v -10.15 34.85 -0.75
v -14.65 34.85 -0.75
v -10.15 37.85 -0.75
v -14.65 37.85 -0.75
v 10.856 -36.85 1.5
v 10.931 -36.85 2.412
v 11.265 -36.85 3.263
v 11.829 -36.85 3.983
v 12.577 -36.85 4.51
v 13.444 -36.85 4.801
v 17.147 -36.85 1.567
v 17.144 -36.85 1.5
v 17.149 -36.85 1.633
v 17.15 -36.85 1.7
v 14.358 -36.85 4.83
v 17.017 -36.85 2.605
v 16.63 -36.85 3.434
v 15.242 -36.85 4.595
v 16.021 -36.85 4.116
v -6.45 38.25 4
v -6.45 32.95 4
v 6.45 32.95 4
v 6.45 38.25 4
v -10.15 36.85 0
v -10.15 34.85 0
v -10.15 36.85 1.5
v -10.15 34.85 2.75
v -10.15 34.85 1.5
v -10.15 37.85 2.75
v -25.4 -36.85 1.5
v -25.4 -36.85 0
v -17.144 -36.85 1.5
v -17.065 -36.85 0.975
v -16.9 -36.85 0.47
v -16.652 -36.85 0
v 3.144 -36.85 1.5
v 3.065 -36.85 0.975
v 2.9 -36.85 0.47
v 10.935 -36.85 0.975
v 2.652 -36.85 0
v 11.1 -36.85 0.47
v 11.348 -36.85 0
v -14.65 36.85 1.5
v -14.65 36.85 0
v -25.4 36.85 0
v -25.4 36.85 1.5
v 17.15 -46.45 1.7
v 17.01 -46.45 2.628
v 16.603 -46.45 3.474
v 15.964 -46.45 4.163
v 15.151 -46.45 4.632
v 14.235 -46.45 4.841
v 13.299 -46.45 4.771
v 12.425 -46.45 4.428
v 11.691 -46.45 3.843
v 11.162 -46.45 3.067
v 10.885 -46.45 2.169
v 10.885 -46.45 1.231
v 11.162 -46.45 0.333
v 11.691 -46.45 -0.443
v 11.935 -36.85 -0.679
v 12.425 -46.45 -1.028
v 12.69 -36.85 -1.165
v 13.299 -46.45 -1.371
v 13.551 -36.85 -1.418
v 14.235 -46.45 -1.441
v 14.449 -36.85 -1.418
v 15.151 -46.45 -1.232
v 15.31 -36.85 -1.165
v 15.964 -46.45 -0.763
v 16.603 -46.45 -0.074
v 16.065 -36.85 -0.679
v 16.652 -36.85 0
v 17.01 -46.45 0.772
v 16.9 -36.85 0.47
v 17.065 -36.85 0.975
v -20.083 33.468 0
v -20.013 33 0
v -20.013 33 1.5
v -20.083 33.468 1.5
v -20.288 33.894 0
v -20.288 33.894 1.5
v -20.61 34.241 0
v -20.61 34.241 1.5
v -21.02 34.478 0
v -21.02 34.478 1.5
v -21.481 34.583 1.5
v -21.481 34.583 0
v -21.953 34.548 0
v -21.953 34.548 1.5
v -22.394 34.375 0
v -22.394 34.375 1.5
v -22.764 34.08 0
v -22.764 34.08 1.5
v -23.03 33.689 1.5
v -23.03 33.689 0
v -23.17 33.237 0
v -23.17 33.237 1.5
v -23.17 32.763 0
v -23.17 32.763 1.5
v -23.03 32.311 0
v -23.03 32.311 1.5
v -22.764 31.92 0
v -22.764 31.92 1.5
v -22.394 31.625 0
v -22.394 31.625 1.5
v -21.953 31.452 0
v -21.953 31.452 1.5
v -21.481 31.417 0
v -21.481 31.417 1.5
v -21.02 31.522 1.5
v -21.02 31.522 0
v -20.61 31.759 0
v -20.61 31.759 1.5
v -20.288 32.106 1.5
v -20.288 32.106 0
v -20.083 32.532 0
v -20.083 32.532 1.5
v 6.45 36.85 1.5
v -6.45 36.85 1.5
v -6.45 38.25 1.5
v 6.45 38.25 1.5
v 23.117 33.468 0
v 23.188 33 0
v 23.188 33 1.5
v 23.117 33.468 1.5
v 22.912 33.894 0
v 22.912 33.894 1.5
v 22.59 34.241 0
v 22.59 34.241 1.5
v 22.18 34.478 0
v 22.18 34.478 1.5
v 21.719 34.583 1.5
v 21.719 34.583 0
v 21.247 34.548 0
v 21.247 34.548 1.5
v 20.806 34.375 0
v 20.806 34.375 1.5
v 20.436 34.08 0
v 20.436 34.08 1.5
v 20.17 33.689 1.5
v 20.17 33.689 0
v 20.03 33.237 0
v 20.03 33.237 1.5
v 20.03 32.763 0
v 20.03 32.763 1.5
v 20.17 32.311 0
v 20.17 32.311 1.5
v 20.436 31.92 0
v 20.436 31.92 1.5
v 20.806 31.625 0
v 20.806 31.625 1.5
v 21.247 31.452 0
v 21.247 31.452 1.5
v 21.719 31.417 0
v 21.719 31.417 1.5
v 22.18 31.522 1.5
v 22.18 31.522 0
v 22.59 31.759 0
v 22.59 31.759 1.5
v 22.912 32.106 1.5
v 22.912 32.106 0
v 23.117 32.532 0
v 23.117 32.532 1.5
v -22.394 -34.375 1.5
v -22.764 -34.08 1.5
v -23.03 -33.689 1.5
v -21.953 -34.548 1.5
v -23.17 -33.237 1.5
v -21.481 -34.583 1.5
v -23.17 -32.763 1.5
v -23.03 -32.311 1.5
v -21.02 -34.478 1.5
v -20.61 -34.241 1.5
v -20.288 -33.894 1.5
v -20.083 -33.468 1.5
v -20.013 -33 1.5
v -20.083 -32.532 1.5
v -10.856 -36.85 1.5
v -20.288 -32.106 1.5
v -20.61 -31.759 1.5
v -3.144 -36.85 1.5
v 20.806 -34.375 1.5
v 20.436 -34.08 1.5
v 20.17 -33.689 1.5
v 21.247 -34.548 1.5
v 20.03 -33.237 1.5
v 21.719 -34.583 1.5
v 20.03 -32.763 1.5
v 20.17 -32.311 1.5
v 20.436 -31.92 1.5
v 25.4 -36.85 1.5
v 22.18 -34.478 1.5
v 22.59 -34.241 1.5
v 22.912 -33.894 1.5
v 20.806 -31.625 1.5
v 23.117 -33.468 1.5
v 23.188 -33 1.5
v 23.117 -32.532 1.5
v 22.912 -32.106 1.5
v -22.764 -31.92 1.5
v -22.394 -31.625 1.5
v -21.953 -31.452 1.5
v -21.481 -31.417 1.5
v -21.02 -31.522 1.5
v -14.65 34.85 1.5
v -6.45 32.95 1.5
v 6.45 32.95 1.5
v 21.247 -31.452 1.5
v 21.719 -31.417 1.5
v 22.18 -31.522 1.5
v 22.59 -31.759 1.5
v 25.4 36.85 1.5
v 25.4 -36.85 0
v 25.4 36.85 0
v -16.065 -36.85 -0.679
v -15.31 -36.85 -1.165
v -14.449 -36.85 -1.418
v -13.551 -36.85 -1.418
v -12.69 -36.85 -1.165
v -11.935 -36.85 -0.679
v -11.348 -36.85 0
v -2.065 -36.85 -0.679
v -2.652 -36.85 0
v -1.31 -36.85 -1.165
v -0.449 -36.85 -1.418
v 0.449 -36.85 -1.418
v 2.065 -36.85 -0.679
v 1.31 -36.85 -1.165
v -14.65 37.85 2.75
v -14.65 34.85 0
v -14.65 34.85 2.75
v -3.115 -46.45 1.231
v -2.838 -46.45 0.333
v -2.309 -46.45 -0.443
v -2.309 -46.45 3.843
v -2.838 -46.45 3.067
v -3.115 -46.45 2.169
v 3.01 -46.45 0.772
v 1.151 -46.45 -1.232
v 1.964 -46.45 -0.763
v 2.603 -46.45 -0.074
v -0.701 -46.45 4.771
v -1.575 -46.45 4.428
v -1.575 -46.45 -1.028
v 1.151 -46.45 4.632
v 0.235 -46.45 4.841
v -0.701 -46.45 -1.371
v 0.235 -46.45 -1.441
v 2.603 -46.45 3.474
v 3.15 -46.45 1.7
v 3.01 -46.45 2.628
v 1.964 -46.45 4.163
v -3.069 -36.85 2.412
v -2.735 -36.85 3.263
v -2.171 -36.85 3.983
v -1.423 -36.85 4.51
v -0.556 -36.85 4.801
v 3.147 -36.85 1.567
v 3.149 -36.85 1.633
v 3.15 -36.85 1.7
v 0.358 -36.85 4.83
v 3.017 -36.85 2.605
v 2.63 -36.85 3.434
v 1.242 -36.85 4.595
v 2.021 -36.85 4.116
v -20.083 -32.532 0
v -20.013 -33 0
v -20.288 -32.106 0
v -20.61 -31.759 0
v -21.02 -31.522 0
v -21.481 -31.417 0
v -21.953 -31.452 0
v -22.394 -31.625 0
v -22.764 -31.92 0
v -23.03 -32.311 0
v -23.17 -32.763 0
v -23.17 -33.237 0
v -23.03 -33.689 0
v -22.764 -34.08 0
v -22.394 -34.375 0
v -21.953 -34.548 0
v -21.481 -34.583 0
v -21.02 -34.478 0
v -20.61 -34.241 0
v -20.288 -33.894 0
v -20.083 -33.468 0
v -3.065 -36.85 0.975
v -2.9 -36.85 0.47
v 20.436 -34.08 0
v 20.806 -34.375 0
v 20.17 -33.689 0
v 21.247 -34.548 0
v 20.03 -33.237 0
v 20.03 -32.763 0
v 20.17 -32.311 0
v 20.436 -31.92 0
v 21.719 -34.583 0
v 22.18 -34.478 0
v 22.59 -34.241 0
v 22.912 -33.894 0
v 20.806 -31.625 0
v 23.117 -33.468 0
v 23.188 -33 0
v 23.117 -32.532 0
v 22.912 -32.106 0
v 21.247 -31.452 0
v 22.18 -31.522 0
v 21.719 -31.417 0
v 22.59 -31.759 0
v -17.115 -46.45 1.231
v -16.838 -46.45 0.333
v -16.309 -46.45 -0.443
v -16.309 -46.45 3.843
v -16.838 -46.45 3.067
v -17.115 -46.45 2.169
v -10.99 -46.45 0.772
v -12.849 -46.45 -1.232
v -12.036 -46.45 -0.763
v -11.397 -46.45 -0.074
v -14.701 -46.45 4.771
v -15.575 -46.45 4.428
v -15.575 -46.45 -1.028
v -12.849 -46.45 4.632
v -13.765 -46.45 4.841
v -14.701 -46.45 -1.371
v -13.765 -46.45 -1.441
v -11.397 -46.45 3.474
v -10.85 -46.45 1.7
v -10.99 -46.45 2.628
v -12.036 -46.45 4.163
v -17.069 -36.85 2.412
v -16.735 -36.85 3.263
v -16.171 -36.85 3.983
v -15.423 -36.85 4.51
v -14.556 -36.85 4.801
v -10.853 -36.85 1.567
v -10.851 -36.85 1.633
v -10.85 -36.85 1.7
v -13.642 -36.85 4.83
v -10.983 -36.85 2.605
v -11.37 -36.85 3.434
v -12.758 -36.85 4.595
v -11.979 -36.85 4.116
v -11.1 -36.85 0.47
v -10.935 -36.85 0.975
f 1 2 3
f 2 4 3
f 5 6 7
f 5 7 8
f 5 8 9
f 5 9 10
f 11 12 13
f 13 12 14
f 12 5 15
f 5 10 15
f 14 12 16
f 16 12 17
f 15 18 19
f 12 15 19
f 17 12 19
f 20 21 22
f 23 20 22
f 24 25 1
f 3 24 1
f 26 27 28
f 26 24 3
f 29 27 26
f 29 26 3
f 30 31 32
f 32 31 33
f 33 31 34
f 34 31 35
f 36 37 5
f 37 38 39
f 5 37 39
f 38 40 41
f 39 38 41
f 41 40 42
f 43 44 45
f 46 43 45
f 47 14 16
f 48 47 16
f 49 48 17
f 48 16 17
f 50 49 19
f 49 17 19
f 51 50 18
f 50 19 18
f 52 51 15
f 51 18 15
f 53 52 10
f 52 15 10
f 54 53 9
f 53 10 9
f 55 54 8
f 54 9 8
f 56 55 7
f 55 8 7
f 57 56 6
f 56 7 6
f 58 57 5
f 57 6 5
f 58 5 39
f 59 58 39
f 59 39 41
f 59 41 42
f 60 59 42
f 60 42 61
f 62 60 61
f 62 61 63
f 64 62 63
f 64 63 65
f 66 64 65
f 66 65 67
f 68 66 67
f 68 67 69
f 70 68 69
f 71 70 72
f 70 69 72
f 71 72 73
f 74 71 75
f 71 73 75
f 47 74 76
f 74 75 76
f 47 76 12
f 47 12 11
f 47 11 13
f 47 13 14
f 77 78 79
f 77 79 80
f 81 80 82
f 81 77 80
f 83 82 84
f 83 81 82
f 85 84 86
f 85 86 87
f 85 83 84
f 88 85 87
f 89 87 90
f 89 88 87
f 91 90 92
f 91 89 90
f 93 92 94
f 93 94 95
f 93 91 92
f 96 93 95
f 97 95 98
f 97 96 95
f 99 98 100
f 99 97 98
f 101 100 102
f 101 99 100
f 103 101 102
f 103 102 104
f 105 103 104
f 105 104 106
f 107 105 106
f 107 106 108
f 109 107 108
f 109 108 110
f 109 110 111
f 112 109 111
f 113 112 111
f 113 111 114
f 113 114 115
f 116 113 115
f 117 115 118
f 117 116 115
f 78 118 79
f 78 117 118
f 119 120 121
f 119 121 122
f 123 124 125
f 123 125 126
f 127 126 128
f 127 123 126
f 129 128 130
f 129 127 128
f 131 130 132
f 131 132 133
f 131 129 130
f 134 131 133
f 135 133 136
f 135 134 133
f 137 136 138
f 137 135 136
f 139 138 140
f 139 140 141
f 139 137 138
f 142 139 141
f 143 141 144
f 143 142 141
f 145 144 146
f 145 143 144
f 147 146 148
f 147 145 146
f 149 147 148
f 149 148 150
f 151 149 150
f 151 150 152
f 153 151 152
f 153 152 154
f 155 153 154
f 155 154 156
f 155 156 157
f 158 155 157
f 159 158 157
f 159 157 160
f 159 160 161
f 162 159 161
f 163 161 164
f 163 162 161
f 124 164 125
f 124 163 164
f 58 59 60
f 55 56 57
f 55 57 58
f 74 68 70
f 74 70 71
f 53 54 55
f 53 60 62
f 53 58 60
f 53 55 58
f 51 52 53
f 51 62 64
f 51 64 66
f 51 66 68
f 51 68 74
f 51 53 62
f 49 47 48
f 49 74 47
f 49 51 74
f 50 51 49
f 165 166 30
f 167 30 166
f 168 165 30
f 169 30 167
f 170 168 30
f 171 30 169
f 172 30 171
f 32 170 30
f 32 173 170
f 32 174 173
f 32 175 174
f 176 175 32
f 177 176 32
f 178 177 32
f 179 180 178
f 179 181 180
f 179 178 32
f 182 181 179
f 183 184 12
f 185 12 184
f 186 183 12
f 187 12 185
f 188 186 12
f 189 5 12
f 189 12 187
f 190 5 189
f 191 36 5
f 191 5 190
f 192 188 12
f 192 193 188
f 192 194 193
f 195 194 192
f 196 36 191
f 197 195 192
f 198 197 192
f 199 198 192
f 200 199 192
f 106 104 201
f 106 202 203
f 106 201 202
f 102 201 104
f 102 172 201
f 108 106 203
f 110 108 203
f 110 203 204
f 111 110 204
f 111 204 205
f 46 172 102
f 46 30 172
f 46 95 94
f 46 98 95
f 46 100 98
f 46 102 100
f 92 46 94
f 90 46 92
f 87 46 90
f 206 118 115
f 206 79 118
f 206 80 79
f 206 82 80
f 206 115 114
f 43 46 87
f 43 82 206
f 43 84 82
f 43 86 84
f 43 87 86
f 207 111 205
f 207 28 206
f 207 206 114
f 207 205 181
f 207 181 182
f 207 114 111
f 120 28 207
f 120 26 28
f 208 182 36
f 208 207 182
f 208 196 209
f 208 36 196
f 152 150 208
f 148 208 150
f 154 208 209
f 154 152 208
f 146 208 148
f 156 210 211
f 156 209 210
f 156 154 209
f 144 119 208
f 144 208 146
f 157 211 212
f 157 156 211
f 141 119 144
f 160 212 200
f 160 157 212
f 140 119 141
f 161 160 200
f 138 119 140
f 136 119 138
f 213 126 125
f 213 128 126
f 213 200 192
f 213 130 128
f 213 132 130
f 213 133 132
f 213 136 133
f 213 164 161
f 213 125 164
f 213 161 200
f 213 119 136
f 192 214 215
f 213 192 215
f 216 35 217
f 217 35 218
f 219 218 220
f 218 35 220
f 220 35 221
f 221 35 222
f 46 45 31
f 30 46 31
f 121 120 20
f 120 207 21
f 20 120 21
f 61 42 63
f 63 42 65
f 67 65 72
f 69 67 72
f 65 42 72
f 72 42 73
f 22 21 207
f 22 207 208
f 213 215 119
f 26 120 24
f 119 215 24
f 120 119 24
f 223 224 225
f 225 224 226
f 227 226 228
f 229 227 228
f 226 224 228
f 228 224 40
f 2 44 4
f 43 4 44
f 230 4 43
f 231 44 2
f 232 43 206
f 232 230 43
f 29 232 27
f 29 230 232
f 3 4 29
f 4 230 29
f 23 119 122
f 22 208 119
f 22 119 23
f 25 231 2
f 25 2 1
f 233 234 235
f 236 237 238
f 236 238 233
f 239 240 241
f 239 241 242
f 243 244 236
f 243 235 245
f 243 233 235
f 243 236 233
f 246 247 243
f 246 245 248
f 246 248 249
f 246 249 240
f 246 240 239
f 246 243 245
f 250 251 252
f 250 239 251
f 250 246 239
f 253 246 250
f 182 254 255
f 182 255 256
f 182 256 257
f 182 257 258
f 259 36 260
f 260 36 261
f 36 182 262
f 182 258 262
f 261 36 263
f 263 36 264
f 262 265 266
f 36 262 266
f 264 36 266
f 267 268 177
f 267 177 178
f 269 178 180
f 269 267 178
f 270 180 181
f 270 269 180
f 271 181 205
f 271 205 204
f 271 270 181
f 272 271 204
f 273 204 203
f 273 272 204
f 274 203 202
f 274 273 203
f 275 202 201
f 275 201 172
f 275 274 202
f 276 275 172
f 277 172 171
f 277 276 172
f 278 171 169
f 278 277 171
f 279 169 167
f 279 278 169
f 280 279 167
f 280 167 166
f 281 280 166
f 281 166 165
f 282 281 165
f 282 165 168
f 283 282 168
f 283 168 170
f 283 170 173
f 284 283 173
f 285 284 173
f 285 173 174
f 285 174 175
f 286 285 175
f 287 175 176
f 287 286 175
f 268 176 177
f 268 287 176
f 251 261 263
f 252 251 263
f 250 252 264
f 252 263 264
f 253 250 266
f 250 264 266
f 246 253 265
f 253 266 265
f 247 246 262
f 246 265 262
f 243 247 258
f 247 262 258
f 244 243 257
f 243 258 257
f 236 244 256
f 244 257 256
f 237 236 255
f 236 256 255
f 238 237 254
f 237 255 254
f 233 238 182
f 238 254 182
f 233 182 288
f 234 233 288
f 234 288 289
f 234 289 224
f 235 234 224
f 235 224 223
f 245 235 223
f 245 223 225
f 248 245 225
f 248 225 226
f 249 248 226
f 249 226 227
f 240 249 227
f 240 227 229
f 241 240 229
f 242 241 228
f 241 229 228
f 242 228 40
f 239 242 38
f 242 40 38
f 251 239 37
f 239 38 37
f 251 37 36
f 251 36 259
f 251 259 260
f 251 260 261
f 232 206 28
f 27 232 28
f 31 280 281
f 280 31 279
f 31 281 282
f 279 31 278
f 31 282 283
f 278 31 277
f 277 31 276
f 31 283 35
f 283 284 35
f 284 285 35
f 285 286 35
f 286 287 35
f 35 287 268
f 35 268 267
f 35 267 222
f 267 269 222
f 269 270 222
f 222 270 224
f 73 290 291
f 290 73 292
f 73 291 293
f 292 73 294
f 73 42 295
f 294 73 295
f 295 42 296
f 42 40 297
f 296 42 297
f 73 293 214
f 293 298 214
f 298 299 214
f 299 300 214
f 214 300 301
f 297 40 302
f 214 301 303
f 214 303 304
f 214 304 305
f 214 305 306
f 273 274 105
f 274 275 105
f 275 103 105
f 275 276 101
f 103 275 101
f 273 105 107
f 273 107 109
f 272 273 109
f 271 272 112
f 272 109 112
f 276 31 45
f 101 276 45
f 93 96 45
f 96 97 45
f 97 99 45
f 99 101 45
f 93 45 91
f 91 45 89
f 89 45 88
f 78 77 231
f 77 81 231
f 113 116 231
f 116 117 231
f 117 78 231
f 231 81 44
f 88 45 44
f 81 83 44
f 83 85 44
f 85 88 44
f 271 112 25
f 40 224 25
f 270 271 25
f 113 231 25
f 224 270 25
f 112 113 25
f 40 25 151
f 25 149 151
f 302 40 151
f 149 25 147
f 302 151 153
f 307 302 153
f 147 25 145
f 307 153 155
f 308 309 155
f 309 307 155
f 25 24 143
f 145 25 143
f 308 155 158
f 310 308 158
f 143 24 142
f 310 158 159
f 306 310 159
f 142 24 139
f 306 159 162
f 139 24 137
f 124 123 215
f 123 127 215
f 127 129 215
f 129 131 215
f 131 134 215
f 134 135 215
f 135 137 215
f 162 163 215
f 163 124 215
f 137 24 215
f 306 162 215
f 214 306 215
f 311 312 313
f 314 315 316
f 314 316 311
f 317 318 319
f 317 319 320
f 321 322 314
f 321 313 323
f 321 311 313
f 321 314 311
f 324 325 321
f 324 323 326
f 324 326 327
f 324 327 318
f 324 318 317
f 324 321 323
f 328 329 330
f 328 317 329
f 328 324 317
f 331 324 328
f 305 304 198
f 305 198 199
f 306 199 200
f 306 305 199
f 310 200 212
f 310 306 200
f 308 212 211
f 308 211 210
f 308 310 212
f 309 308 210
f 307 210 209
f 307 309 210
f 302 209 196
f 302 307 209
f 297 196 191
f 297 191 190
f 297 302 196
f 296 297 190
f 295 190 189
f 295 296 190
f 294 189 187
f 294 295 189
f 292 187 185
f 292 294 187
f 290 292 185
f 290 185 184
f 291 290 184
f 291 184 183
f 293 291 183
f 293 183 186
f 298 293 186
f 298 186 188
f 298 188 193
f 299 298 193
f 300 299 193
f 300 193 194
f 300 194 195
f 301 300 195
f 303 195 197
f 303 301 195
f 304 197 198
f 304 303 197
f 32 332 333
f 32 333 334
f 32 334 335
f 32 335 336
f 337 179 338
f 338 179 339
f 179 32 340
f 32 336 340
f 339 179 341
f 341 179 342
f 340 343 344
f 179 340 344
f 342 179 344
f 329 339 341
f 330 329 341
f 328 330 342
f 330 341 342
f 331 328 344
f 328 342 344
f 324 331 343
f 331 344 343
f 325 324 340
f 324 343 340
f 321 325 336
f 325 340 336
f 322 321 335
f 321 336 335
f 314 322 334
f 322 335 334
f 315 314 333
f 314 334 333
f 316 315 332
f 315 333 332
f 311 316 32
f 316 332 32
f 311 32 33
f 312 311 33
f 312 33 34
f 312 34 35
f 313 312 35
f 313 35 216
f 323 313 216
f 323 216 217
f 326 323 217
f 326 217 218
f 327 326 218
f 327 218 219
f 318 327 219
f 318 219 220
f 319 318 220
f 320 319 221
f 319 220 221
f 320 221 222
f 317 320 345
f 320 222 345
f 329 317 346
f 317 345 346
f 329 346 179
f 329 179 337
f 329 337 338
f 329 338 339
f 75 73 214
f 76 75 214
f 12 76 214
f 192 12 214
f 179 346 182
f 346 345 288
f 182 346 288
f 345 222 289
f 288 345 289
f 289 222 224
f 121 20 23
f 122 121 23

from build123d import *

# Parameters (mm, degrees)
F0_R          = 1.5875
F0_W          = 4.5
F0_H          = 2
F3_DEPTH      = 1.5
F4_START      = 36.85
F1_R          = 3.15
F4_DEPTH      = 9.6
F5_START      = -32.95
F2_W          = 12.9
F2_H          = 2.5
F5_DEPTH      = 5.3
F0_H_2        = 1
F6_DEPTH      = 2.75
F6_DEPTH_BACK = 0.75


with BuildPart() as f3:
    # F0 (on Top) → F3 (new body)
    with BuildSketch(Plane.XY):
        Polygon((-25.4, -36.85), (25.4, -36.85), (25.4, 36.85), (-10.15, 36.85), (-10.15, 34.85), (-14.65, 34.85), (-14.65, 36.85), (-25.4, 36.85), align=None)
        with Locations((-21.6, -33)):
            Circle(F0_R, mode=Mode.SUBTRACT)
        with Locations((21.6, -33)):
            Circle(F0_R, mode=Mode.SUBTRACT)
        with Locations((-21.6, 33)):
            Circle(F0_R, mode=Mode.SUBTRACT)
        with Locations((21.6, 33)):
            Circle(F0_R, mode=Mode.SUBTRACT)
        with Locations((-12.4, 35.85)):
            Rectangle(F0_W, F0_H)
    extrude(amount=F3_DEPTH)

    # F1 (on Front) → F4 (join)
    with BuildSketch(Plane.XZ.offset(F4_START)):
        with Locations((-14, 1.7)):
            Circle(F1_R)
        with Locations((0, 1.7)):
            Circle(F1_R)
        with Locations((14, 1.7)):
            Circle(F1_R)
    extrude(amount=F4_DEPTH)

    # F2 (on Front) → F5 (join)
    with BuildSketch(Plane.XZ.offset(F5_START)):
        with Locations((0, 2.75)):
            Rectangle(F2_W, F2_H)
    extrude(amount=-F5_DEPTH)

    # F0 (on Top) → F6 (join, two sides)
    with BuildSketch(Plane.XY) as f6_sk:
        with Locations((-12.4, 35.85)):
            Rectangle(F0_W, F0_H)
        with Locations((-12.4, 37.35)):
            Rectangle(F0_W, F0_H_2)
    extrude(amount=F6_DEPTH)
    extrude(f6_sk.sketch, amount=-F6_DEPTH_BACK)


solid = f3.part
